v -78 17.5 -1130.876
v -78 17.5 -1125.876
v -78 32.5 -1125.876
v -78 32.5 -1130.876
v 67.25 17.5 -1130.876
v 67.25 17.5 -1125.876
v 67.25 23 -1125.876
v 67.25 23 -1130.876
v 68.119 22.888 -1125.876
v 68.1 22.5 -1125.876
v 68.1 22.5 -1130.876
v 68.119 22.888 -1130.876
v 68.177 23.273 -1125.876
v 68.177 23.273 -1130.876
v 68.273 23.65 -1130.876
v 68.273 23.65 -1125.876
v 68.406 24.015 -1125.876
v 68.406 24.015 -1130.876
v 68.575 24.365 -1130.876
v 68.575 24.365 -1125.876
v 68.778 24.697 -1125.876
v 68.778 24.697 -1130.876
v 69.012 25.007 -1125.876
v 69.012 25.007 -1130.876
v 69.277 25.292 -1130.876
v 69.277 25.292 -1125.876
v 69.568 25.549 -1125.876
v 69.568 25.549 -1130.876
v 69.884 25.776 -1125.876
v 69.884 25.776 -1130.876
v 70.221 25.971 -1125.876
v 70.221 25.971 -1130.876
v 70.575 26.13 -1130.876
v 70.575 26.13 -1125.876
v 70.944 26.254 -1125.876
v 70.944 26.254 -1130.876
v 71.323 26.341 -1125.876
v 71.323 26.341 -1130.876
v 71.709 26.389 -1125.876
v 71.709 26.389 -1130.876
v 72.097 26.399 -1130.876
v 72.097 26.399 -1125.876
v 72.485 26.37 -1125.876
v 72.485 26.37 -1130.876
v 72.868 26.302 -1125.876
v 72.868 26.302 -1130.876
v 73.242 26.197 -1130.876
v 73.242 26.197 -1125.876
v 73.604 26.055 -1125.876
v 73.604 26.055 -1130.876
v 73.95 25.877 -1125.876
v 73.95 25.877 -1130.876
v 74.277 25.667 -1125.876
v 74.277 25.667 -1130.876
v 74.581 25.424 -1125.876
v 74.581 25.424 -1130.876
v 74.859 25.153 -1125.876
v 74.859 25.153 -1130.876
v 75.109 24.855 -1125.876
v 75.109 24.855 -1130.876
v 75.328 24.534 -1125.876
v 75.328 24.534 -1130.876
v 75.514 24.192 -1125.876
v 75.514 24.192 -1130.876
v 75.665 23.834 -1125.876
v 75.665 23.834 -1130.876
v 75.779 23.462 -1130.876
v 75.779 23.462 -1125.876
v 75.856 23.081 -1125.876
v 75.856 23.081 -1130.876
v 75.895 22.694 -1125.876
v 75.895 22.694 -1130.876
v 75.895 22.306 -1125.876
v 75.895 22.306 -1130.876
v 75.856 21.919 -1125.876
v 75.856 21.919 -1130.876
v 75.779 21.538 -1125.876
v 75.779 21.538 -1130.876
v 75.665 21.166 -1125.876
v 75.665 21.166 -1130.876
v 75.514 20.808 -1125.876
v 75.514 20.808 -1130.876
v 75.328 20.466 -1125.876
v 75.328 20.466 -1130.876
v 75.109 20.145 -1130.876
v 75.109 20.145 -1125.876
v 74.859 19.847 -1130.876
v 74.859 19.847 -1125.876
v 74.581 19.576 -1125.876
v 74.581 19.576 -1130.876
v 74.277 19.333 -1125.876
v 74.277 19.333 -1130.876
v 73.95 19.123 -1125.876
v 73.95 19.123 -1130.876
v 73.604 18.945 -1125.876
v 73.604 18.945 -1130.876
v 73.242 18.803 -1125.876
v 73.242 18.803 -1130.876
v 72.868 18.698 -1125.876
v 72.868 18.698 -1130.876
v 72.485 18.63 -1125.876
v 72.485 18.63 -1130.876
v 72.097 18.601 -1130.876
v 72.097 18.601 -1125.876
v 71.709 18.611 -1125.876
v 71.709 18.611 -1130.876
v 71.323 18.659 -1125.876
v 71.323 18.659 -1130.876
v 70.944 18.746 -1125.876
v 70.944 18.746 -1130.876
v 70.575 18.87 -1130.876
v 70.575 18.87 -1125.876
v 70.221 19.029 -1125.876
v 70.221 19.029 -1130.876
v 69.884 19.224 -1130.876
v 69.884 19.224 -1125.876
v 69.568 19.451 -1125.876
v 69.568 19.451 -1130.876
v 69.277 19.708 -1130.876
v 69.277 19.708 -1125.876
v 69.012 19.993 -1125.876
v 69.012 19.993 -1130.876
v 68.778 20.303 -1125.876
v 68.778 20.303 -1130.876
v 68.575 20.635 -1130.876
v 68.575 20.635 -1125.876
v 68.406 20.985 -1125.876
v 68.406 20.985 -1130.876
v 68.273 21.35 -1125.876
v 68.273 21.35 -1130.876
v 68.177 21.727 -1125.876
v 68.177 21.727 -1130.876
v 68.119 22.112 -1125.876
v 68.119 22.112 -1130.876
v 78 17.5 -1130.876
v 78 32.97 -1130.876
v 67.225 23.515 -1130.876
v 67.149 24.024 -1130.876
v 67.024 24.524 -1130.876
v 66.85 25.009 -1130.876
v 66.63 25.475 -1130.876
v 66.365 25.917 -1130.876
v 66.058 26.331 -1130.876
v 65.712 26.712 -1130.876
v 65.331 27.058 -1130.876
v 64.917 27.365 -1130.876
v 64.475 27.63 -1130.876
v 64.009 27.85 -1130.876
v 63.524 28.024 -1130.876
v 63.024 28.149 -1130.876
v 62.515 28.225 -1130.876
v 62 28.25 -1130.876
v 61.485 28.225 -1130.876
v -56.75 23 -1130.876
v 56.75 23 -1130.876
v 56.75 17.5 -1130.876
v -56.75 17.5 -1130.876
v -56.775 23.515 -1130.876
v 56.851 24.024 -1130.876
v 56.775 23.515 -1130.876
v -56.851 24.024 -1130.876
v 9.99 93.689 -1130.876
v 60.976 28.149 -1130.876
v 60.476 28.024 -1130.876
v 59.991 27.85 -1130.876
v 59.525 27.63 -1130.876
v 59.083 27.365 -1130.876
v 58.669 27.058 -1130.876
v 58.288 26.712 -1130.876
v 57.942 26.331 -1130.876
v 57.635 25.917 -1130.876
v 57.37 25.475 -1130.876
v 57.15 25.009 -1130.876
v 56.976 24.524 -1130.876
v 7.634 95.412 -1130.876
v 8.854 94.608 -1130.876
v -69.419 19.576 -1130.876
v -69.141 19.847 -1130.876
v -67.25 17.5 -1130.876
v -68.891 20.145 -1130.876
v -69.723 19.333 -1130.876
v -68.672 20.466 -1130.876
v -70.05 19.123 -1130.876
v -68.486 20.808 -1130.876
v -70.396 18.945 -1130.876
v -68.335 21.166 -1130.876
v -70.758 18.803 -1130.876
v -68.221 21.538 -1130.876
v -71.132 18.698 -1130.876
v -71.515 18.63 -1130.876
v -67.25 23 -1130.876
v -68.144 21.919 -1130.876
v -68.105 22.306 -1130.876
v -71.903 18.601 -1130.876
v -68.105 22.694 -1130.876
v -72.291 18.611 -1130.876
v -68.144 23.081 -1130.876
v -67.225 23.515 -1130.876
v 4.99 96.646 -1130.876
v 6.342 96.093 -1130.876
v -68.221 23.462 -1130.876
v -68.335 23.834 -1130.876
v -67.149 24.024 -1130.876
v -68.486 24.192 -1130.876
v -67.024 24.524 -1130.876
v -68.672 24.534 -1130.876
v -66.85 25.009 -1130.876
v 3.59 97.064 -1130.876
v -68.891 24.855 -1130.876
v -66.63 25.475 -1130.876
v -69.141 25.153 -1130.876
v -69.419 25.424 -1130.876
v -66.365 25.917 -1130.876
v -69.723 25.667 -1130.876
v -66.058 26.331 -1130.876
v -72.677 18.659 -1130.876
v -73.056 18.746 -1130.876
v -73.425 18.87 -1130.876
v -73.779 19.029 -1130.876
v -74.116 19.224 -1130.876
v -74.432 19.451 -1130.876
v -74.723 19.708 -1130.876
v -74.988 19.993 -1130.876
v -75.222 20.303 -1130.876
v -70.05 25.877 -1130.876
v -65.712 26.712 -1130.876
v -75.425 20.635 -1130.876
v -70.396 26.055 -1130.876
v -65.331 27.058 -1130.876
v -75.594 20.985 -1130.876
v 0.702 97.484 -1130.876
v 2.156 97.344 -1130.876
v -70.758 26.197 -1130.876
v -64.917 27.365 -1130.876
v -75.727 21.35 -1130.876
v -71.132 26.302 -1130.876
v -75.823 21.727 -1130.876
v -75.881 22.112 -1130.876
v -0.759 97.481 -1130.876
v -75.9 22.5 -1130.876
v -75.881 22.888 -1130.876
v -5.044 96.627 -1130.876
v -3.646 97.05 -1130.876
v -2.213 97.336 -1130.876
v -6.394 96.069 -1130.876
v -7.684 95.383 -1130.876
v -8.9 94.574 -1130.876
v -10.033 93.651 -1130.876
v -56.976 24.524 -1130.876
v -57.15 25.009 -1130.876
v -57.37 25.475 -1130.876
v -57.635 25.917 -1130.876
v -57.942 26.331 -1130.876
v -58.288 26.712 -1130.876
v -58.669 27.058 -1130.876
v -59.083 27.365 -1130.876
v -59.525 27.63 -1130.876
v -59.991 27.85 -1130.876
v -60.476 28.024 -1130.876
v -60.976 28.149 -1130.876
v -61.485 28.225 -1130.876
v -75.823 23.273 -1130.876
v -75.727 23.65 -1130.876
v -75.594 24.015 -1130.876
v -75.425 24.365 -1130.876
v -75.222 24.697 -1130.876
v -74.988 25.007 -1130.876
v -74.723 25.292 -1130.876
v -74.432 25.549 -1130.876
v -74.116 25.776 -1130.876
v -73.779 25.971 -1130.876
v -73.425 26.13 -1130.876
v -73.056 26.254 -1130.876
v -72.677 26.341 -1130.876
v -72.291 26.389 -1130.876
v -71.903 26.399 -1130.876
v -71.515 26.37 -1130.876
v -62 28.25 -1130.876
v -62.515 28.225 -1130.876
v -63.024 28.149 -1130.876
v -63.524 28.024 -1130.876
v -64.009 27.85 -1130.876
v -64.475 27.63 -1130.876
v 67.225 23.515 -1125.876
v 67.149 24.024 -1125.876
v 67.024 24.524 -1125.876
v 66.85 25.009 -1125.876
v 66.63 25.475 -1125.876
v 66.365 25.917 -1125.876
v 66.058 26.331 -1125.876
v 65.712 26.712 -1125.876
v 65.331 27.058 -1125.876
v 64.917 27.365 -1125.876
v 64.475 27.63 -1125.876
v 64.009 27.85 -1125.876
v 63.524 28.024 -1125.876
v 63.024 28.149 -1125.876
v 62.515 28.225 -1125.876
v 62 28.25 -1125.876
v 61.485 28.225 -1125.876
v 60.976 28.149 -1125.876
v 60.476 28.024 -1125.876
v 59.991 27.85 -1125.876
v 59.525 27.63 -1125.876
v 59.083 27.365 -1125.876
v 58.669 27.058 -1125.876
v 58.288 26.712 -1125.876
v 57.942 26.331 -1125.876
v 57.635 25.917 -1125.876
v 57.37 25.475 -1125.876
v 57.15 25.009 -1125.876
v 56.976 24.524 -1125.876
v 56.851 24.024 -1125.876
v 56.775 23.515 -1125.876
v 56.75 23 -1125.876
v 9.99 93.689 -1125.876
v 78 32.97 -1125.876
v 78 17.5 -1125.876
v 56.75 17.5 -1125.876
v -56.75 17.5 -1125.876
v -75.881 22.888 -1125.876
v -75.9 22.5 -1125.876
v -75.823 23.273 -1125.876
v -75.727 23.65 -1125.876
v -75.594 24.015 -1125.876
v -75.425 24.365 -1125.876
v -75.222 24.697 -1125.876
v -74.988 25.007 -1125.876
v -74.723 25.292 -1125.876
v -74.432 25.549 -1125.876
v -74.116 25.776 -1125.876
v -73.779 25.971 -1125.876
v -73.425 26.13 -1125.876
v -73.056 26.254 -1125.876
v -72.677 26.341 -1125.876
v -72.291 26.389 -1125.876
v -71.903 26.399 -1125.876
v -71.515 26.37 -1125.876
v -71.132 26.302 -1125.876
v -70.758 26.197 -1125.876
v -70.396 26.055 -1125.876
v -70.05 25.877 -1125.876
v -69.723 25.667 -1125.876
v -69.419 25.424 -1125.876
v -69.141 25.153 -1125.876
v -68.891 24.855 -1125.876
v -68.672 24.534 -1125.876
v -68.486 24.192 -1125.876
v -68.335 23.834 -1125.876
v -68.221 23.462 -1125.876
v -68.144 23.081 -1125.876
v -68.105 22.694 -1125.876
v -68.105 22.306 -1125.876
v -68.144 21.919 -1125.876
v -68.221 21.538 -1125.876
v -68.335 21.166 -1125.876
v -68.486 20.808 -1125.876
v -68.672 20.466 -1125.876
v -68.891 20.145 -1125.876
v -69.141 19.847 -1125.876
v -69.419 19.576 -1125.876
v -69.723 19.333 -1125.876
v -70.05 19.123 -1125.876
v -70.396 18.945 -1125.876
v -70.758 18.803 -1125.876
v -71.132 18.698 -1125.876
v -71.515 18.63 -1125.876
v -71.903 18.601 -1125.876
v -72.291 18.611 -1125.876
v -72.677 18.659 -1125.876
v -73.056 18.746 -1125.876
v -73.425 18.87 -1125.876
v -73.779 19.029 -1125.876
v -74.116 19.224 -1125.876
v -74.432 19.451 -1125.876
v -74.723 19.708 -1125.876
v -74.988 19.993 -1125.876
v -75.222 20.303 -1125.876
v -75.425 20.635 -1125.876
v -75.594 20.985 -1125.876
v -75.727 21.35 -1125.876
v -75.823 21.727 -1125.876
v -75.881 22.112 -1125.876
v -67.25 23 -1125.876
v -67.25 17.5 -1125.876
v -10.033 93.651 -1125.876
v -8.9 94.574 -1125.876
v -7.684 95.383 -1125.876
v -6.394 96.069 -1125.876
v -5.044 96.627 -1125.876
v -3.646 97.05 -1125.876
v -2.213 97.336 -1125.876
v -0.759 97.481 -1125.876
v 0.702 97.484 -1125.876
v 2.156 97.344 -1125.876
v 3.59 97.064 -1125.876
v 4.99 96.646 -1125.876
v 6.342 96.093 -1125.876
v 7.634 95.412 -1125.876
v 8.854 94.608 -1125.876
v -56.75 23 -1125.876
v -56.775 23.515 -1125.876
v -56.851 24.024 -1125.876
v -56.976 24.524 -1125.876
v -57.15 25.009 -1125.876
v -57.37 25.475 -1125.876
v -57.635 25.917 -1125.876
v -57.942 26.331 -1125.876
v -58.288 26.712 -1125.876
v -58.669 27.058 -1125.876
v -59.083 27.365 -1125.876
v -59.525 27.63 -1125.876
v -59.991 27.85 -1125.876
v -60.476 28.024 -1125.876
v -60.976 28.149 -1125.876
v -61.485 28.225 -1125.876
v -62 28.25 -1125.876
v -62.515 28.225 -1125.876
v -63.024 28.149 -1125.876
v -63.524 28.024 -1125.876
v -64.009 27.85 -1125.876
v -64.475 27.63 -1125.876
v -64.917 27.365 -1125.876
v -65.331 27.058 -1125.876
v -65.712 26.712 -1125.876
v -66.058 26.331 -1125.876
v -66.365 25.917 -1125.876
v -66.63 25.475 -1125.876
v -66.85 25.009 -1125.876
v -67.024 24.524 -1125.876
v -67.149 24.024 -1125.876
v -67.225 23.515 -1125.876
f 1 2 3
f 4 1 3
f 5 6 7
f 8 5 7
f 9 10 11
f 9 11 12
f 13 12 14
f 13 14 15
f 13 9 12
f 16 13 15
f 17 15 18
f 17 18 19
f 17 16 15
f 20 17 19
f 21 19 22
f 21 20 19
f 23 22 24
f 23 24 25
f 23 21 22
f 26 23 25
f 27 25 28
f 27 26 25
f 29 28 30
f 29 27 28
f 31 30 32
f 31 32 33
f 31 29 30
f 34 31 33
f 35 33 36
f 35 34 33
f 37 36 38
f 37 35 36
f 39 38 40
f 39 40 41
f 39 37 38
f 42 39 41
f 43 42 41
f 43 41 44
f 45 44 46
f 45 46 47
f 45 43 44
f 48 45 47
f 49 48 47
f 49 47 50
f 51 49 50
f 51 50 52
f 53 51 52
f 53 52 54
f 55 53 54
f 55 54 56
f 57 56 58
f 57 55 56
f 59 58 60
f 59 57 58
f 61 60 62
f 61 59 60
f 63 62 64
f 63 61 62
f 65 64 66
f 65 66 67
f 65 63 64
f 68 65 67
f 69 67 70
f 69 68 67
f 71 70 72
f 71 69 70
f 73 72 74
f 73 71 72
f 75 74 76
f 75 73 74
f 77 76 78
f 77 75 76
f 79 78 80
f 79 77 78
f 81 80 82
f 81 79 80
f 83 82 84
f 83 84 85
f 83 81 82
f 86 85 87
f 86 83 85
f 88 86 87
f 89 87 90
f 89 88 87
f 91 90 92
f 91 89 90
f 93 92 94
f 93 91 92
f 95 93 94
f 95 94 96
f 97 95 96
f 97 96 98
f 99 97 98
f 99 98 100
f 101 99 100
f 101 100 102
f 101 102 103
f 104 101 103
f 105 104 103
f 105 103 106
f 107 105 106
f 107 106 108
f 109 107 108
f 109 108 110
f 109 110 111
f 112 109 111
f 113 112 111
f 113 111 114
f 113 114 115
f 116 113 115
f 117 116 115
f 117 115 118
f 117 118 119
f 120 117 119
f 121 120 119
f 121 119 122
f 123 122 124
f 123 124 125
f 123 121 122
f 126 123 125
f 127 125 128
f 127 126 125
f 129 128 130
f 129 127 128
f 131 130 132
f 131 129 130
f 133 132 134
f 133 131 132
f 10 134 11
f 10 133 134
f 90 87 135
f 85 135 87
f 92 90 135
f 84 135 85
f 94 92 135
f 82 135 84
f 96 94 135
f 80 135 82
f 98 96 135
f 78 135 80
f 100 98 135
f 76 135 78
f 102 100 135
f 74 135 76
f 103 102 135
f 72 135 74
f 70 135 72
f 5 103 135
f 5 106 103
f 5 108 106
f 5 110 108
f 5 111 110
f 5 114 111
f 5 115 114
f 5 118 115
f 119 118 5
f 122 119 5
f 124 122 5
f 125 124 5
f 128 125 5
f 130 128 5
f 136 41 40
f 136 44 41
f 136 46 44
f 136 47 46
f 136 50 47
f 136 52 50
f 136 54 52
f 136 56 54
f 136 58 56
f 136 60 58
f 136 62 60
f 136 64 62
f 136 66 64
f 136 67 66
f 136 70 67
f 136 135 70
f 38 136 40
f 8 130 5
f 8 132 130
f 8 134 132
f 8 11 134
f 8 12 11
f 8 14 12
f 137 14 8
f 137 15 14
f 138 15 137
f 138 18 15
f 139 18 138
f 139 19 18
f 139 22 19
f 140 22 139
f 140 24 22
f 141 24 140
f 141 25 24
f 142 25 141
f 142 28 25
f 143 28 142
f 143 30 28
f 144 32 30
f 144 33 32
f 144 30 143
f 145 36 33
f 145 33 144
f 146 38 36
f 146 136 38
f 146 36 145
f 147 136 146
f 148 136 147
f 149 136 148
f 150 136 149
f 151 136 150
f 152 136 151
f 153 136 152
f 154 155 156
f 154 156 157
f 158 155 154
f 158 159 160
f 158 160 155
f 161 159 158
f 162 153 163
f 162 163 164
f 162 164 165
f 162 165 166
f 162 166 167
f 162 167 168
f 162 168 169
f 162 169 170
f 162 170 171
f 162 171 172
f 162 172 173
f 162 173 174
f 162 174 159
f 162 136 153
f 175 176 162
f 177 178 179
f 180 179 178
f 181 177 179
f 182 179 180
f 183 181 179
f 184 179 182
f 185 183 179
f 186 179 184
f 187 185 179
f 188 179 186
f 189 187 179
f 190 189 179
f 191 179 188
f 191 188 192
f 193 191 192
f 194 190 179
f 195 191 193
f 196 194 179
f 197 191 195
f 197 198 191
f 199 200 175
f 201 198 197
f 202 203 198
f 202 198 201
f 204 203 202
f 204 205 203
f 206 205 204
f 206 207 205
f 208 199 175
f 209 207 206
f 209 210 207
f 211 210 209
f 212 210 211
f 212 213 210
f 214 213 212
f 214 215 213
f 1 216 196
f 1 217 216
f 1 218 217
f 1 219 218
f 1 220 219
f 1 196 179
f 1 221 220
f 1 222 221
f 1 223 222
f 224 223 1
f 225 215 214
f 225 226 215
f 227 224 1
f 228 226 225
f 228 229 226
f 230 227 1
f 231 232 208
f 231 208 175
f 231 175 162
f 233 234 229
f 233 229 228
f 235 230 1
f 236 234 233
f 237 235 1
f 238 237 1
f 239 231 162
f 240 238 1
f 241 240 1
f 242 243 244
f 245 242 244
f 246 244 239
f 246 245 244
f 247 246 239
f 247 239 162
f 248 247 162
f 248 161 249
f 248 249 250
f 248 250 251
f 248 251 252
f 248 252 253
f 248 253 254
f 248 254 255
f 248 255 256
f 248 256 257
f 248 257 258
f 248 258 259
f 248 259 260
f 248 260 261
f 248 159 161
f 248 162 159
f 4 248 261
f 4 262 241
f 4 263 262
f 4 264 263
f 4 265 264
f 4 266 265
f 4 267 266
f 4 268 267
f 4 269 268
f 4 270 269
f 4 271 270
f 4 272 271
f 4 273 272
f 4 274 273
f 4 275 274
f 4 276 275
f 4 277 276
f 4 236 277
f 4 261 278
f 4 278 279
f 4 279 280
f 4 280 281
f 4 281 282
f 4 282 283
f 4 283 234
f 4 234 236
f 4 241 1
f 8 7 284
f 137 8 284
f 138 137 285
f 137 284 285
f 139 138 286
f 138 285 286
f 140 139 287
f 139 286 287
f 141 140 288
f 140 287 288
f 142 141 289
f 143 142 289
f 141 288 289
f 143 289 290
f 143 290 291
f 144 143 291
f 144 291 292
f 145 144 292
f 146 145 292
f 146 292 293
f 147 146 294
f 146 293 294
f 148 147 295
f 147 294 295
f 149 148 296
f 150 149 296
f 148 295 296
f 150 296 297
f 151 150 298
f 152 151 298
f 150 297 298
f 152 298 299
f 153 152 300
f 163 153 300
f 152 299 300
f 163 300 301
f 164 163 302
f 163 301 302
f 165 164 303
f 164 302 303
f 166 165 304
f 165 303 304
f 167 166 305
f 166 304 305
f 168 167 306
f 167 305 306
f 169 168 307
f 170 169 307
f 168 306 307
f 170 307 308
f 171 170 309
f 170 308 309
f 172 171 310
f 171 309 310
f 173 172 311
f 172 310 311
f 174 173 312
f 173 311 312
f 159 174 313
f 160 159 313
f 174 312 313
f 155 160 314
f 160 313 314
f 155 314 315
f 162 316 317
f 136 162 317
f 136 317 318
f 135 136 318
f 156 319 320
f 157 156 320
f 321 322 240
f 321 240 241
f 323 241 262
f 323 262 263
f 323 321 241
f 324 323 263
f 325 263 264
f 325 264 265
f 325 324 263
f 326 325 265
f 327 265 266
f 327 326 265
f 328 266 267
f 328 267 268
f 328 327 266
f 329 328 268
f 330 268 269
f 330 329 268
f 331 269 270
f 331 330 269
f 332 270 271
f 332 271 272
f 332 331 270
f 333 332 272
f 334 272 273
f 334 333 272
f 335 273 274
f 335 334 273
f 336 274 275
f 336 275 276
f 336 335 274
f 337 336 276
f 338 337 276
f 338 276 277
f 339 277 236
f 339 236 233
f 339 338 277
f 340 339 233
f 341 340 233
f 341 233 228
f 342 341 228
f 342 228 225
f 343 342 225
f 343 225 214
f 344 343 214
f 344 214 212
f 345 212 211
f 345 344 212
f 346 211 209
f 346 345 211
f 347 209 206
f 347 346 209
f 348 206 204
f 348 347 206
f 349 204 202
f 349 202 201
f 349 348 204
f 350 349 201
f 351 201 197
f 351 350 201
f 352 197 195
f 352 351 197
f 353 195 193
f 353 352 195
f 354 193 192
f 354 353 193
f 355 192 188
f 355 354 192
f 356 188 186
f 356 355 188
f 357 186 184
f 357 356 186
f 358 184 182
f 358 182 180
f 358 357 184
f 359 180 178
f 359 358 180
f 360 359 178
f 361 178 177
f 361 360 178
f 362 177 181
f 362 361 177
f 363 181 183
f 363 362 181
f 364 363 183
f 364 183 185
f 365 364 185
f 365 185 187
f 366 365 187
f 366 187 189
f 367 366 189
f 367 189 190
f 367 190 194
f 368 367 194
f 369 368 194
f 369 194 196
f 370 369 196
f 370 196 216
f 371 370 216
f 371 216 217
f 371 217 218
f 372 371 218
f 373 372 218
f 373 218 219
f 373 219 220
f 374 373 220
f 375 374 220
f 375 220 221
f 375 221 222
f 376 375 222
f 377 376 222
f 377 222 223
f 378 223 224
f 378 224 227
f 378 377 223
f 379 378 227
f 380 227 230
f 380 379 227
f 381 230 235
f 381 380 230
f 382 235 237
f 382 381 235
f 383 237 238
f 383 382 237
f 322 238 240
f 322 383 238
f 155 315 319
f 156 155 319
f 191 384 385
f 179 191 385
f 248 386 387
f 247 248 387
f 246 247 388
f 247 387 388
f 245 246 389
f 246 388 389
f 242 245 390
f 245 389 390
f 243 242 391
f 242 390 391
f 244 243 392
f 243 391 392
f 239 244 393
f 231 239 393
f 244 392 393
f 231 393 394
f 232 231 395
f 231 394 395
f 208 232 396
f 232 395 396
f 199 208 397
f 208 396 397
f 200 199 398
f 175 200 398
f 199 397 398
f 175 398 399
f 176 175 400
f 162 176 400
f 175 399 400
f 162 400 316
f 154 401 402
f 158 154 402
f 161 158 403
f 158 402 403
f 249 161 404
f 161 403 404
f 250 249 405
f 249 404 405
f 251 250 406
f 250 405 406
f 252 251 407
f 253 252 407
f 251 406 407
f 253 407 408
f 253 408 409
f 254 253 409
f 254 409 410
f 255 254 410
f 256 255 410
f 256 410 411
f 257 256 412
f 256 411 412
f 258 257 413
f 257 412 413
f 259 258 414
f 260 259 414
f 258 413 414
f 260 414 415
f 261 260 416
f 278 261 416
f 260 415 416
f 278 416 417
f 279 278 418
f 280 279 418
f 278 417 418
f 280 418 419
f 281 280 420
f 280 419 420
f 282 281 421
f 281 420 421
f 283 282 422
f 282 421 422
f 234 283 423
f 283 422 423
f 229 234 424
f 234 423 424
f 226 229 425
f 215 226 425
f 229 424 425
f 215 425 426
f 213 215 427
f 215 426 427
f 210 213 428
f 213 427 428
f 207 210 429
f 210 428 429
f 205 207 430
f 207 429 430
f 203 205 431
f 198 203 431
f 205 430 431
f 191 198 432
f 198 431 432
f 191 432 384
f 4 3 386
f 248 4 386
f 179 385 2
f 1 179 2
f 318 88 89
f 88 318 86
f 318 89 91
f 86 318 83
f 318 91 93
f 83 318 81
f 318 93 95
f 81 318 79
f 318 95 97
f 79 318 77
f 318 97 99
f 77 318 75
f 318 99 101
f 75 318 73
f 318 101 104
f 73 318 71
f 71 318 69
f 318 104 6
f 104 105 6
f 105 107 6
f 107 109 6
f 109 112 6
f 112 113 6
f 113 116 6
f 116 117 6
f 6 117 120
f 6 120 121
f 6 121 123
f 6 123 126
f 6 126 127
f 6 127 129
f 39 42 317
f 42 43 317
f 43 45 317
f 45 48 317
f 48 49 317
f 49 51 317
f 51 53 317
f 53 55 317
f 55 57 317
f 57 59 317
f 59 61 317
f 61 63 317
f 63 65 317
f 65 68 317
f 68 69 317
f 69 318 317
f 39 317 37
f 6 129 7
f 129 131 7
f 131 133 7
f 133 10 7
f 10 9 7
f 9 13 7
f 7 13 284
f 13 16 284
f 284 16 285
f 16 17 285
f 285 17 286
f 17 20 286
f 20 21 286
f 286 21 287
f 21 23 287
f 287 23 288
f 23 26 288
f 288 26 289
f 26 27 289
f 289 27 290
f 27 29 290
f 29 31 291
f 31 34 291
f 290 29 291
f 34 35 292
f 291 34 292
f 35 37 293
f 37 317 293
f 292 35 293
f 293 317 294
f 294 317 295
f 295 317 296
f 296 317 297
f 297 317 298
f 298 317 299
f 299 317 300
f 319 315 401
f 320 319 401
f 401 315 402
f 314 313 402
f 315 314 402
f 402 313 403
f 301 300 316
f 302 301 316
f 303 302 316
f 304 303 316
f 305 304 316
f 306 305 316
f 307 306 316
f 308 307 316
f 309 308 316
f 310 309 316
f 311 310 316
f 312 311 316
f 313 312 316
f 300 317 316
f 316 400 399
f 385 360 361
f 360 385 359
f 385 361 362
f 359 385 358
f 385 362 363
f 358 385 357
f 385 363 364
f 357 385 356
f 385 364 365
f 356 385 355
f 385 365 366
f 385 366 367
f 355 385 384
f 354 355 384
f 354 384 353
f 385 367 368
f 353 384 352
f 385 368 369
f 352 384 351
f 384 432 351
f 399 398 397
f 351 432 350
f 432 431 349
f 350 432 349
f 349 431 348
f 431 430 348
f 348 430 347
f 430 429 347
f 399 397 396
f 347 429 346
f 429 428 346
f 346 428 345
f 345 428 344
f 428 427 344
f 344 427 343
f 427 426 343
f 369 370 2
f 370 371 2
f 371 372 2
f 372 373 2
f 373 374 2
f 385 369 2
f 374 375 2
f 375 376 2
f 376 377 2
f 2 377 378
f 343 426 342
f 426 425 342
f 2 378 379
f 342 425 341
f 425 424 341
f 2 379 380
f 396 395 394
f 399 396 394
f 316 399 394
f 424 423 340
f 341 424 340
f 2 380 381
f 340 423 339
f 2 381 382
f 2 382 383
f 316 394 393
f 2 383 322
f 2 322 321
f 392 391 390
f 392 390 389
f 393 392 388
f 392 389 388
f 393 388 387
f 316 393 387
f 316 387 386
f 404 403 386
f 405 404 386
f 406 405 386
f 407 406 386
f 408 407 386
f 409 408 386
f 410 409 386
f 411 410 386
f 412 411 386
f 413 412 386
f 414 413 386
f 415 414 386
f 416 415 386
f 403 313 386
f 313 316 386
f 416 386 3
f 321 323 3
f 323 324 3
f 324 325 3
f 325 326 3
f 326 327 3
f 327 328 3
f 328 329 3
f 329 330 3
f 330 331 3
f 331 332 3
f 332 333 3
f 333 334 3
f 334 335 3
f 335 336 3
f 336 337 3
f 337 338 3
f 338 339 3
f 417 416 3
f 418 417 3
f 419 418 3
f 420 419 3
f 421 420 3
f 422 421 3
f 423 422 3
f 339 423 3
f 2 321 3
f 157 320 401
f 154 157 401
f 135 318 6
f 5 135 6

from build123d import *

# Parameters (mm, degrees)
SKETCH2_R           = 3.9
BOSS_EXTRUDE1_DEPTH = 5


with BuildPart() as part:
    # Sketch2 → Boss-Extrude1 (new body)
    with BuildSketch(Plane(origin=(0, 0, -1125.876159911), x_dir=(-1, 0, 0), z_dir=(0, 0, -1))):
        with BuildLine():
            Line((78, 17.5), (78, 32.5))
            Line((78, 32.5), (10.032697486, 93.651008078))
            ThreePointArc((10.032697486, 93.651008078), (0.028721986, 97.499972502), (-9.989920116, 93.689347438))
            Line((-9.989920116, 93.689347438), (-78, 32.969518252))
            Line((-78, 32.969518252), (-78, 17.5))
            Line((-78, 17.5), (-67.25, 17.5))
            Line((-67.25, 17.5), (-67.25, 23))
            ThreePointArc((-67.25, 23), (-62, 28.25), (-56.75, 23))
            Line((-56.75, 23), (-56.75, 17.5))
            Line((-56.75, 17.5), (56.75, 17.5))
            Line((56.75, 17.5), (56.75, 23))
            ThreePointArc((56.75, 23), (62, 28.25), (67.25, 23))
            Line((67.25, 23), (67.25, 17.5))
            Line((67.25, 17.5), (78, 17.5))
        make_face()
        with Locations((72, 22.5)):
            Circle(SKETCH2_R, mode=Mode.SUBTRACT)
        with Locations((-72, 22.5)):
            Circle(SKETCH2_R, mode=Mode.SUBTRACT)
    extrude(amount=BOSS_EXTRUDE1_DEPTH)


solid = part.part
